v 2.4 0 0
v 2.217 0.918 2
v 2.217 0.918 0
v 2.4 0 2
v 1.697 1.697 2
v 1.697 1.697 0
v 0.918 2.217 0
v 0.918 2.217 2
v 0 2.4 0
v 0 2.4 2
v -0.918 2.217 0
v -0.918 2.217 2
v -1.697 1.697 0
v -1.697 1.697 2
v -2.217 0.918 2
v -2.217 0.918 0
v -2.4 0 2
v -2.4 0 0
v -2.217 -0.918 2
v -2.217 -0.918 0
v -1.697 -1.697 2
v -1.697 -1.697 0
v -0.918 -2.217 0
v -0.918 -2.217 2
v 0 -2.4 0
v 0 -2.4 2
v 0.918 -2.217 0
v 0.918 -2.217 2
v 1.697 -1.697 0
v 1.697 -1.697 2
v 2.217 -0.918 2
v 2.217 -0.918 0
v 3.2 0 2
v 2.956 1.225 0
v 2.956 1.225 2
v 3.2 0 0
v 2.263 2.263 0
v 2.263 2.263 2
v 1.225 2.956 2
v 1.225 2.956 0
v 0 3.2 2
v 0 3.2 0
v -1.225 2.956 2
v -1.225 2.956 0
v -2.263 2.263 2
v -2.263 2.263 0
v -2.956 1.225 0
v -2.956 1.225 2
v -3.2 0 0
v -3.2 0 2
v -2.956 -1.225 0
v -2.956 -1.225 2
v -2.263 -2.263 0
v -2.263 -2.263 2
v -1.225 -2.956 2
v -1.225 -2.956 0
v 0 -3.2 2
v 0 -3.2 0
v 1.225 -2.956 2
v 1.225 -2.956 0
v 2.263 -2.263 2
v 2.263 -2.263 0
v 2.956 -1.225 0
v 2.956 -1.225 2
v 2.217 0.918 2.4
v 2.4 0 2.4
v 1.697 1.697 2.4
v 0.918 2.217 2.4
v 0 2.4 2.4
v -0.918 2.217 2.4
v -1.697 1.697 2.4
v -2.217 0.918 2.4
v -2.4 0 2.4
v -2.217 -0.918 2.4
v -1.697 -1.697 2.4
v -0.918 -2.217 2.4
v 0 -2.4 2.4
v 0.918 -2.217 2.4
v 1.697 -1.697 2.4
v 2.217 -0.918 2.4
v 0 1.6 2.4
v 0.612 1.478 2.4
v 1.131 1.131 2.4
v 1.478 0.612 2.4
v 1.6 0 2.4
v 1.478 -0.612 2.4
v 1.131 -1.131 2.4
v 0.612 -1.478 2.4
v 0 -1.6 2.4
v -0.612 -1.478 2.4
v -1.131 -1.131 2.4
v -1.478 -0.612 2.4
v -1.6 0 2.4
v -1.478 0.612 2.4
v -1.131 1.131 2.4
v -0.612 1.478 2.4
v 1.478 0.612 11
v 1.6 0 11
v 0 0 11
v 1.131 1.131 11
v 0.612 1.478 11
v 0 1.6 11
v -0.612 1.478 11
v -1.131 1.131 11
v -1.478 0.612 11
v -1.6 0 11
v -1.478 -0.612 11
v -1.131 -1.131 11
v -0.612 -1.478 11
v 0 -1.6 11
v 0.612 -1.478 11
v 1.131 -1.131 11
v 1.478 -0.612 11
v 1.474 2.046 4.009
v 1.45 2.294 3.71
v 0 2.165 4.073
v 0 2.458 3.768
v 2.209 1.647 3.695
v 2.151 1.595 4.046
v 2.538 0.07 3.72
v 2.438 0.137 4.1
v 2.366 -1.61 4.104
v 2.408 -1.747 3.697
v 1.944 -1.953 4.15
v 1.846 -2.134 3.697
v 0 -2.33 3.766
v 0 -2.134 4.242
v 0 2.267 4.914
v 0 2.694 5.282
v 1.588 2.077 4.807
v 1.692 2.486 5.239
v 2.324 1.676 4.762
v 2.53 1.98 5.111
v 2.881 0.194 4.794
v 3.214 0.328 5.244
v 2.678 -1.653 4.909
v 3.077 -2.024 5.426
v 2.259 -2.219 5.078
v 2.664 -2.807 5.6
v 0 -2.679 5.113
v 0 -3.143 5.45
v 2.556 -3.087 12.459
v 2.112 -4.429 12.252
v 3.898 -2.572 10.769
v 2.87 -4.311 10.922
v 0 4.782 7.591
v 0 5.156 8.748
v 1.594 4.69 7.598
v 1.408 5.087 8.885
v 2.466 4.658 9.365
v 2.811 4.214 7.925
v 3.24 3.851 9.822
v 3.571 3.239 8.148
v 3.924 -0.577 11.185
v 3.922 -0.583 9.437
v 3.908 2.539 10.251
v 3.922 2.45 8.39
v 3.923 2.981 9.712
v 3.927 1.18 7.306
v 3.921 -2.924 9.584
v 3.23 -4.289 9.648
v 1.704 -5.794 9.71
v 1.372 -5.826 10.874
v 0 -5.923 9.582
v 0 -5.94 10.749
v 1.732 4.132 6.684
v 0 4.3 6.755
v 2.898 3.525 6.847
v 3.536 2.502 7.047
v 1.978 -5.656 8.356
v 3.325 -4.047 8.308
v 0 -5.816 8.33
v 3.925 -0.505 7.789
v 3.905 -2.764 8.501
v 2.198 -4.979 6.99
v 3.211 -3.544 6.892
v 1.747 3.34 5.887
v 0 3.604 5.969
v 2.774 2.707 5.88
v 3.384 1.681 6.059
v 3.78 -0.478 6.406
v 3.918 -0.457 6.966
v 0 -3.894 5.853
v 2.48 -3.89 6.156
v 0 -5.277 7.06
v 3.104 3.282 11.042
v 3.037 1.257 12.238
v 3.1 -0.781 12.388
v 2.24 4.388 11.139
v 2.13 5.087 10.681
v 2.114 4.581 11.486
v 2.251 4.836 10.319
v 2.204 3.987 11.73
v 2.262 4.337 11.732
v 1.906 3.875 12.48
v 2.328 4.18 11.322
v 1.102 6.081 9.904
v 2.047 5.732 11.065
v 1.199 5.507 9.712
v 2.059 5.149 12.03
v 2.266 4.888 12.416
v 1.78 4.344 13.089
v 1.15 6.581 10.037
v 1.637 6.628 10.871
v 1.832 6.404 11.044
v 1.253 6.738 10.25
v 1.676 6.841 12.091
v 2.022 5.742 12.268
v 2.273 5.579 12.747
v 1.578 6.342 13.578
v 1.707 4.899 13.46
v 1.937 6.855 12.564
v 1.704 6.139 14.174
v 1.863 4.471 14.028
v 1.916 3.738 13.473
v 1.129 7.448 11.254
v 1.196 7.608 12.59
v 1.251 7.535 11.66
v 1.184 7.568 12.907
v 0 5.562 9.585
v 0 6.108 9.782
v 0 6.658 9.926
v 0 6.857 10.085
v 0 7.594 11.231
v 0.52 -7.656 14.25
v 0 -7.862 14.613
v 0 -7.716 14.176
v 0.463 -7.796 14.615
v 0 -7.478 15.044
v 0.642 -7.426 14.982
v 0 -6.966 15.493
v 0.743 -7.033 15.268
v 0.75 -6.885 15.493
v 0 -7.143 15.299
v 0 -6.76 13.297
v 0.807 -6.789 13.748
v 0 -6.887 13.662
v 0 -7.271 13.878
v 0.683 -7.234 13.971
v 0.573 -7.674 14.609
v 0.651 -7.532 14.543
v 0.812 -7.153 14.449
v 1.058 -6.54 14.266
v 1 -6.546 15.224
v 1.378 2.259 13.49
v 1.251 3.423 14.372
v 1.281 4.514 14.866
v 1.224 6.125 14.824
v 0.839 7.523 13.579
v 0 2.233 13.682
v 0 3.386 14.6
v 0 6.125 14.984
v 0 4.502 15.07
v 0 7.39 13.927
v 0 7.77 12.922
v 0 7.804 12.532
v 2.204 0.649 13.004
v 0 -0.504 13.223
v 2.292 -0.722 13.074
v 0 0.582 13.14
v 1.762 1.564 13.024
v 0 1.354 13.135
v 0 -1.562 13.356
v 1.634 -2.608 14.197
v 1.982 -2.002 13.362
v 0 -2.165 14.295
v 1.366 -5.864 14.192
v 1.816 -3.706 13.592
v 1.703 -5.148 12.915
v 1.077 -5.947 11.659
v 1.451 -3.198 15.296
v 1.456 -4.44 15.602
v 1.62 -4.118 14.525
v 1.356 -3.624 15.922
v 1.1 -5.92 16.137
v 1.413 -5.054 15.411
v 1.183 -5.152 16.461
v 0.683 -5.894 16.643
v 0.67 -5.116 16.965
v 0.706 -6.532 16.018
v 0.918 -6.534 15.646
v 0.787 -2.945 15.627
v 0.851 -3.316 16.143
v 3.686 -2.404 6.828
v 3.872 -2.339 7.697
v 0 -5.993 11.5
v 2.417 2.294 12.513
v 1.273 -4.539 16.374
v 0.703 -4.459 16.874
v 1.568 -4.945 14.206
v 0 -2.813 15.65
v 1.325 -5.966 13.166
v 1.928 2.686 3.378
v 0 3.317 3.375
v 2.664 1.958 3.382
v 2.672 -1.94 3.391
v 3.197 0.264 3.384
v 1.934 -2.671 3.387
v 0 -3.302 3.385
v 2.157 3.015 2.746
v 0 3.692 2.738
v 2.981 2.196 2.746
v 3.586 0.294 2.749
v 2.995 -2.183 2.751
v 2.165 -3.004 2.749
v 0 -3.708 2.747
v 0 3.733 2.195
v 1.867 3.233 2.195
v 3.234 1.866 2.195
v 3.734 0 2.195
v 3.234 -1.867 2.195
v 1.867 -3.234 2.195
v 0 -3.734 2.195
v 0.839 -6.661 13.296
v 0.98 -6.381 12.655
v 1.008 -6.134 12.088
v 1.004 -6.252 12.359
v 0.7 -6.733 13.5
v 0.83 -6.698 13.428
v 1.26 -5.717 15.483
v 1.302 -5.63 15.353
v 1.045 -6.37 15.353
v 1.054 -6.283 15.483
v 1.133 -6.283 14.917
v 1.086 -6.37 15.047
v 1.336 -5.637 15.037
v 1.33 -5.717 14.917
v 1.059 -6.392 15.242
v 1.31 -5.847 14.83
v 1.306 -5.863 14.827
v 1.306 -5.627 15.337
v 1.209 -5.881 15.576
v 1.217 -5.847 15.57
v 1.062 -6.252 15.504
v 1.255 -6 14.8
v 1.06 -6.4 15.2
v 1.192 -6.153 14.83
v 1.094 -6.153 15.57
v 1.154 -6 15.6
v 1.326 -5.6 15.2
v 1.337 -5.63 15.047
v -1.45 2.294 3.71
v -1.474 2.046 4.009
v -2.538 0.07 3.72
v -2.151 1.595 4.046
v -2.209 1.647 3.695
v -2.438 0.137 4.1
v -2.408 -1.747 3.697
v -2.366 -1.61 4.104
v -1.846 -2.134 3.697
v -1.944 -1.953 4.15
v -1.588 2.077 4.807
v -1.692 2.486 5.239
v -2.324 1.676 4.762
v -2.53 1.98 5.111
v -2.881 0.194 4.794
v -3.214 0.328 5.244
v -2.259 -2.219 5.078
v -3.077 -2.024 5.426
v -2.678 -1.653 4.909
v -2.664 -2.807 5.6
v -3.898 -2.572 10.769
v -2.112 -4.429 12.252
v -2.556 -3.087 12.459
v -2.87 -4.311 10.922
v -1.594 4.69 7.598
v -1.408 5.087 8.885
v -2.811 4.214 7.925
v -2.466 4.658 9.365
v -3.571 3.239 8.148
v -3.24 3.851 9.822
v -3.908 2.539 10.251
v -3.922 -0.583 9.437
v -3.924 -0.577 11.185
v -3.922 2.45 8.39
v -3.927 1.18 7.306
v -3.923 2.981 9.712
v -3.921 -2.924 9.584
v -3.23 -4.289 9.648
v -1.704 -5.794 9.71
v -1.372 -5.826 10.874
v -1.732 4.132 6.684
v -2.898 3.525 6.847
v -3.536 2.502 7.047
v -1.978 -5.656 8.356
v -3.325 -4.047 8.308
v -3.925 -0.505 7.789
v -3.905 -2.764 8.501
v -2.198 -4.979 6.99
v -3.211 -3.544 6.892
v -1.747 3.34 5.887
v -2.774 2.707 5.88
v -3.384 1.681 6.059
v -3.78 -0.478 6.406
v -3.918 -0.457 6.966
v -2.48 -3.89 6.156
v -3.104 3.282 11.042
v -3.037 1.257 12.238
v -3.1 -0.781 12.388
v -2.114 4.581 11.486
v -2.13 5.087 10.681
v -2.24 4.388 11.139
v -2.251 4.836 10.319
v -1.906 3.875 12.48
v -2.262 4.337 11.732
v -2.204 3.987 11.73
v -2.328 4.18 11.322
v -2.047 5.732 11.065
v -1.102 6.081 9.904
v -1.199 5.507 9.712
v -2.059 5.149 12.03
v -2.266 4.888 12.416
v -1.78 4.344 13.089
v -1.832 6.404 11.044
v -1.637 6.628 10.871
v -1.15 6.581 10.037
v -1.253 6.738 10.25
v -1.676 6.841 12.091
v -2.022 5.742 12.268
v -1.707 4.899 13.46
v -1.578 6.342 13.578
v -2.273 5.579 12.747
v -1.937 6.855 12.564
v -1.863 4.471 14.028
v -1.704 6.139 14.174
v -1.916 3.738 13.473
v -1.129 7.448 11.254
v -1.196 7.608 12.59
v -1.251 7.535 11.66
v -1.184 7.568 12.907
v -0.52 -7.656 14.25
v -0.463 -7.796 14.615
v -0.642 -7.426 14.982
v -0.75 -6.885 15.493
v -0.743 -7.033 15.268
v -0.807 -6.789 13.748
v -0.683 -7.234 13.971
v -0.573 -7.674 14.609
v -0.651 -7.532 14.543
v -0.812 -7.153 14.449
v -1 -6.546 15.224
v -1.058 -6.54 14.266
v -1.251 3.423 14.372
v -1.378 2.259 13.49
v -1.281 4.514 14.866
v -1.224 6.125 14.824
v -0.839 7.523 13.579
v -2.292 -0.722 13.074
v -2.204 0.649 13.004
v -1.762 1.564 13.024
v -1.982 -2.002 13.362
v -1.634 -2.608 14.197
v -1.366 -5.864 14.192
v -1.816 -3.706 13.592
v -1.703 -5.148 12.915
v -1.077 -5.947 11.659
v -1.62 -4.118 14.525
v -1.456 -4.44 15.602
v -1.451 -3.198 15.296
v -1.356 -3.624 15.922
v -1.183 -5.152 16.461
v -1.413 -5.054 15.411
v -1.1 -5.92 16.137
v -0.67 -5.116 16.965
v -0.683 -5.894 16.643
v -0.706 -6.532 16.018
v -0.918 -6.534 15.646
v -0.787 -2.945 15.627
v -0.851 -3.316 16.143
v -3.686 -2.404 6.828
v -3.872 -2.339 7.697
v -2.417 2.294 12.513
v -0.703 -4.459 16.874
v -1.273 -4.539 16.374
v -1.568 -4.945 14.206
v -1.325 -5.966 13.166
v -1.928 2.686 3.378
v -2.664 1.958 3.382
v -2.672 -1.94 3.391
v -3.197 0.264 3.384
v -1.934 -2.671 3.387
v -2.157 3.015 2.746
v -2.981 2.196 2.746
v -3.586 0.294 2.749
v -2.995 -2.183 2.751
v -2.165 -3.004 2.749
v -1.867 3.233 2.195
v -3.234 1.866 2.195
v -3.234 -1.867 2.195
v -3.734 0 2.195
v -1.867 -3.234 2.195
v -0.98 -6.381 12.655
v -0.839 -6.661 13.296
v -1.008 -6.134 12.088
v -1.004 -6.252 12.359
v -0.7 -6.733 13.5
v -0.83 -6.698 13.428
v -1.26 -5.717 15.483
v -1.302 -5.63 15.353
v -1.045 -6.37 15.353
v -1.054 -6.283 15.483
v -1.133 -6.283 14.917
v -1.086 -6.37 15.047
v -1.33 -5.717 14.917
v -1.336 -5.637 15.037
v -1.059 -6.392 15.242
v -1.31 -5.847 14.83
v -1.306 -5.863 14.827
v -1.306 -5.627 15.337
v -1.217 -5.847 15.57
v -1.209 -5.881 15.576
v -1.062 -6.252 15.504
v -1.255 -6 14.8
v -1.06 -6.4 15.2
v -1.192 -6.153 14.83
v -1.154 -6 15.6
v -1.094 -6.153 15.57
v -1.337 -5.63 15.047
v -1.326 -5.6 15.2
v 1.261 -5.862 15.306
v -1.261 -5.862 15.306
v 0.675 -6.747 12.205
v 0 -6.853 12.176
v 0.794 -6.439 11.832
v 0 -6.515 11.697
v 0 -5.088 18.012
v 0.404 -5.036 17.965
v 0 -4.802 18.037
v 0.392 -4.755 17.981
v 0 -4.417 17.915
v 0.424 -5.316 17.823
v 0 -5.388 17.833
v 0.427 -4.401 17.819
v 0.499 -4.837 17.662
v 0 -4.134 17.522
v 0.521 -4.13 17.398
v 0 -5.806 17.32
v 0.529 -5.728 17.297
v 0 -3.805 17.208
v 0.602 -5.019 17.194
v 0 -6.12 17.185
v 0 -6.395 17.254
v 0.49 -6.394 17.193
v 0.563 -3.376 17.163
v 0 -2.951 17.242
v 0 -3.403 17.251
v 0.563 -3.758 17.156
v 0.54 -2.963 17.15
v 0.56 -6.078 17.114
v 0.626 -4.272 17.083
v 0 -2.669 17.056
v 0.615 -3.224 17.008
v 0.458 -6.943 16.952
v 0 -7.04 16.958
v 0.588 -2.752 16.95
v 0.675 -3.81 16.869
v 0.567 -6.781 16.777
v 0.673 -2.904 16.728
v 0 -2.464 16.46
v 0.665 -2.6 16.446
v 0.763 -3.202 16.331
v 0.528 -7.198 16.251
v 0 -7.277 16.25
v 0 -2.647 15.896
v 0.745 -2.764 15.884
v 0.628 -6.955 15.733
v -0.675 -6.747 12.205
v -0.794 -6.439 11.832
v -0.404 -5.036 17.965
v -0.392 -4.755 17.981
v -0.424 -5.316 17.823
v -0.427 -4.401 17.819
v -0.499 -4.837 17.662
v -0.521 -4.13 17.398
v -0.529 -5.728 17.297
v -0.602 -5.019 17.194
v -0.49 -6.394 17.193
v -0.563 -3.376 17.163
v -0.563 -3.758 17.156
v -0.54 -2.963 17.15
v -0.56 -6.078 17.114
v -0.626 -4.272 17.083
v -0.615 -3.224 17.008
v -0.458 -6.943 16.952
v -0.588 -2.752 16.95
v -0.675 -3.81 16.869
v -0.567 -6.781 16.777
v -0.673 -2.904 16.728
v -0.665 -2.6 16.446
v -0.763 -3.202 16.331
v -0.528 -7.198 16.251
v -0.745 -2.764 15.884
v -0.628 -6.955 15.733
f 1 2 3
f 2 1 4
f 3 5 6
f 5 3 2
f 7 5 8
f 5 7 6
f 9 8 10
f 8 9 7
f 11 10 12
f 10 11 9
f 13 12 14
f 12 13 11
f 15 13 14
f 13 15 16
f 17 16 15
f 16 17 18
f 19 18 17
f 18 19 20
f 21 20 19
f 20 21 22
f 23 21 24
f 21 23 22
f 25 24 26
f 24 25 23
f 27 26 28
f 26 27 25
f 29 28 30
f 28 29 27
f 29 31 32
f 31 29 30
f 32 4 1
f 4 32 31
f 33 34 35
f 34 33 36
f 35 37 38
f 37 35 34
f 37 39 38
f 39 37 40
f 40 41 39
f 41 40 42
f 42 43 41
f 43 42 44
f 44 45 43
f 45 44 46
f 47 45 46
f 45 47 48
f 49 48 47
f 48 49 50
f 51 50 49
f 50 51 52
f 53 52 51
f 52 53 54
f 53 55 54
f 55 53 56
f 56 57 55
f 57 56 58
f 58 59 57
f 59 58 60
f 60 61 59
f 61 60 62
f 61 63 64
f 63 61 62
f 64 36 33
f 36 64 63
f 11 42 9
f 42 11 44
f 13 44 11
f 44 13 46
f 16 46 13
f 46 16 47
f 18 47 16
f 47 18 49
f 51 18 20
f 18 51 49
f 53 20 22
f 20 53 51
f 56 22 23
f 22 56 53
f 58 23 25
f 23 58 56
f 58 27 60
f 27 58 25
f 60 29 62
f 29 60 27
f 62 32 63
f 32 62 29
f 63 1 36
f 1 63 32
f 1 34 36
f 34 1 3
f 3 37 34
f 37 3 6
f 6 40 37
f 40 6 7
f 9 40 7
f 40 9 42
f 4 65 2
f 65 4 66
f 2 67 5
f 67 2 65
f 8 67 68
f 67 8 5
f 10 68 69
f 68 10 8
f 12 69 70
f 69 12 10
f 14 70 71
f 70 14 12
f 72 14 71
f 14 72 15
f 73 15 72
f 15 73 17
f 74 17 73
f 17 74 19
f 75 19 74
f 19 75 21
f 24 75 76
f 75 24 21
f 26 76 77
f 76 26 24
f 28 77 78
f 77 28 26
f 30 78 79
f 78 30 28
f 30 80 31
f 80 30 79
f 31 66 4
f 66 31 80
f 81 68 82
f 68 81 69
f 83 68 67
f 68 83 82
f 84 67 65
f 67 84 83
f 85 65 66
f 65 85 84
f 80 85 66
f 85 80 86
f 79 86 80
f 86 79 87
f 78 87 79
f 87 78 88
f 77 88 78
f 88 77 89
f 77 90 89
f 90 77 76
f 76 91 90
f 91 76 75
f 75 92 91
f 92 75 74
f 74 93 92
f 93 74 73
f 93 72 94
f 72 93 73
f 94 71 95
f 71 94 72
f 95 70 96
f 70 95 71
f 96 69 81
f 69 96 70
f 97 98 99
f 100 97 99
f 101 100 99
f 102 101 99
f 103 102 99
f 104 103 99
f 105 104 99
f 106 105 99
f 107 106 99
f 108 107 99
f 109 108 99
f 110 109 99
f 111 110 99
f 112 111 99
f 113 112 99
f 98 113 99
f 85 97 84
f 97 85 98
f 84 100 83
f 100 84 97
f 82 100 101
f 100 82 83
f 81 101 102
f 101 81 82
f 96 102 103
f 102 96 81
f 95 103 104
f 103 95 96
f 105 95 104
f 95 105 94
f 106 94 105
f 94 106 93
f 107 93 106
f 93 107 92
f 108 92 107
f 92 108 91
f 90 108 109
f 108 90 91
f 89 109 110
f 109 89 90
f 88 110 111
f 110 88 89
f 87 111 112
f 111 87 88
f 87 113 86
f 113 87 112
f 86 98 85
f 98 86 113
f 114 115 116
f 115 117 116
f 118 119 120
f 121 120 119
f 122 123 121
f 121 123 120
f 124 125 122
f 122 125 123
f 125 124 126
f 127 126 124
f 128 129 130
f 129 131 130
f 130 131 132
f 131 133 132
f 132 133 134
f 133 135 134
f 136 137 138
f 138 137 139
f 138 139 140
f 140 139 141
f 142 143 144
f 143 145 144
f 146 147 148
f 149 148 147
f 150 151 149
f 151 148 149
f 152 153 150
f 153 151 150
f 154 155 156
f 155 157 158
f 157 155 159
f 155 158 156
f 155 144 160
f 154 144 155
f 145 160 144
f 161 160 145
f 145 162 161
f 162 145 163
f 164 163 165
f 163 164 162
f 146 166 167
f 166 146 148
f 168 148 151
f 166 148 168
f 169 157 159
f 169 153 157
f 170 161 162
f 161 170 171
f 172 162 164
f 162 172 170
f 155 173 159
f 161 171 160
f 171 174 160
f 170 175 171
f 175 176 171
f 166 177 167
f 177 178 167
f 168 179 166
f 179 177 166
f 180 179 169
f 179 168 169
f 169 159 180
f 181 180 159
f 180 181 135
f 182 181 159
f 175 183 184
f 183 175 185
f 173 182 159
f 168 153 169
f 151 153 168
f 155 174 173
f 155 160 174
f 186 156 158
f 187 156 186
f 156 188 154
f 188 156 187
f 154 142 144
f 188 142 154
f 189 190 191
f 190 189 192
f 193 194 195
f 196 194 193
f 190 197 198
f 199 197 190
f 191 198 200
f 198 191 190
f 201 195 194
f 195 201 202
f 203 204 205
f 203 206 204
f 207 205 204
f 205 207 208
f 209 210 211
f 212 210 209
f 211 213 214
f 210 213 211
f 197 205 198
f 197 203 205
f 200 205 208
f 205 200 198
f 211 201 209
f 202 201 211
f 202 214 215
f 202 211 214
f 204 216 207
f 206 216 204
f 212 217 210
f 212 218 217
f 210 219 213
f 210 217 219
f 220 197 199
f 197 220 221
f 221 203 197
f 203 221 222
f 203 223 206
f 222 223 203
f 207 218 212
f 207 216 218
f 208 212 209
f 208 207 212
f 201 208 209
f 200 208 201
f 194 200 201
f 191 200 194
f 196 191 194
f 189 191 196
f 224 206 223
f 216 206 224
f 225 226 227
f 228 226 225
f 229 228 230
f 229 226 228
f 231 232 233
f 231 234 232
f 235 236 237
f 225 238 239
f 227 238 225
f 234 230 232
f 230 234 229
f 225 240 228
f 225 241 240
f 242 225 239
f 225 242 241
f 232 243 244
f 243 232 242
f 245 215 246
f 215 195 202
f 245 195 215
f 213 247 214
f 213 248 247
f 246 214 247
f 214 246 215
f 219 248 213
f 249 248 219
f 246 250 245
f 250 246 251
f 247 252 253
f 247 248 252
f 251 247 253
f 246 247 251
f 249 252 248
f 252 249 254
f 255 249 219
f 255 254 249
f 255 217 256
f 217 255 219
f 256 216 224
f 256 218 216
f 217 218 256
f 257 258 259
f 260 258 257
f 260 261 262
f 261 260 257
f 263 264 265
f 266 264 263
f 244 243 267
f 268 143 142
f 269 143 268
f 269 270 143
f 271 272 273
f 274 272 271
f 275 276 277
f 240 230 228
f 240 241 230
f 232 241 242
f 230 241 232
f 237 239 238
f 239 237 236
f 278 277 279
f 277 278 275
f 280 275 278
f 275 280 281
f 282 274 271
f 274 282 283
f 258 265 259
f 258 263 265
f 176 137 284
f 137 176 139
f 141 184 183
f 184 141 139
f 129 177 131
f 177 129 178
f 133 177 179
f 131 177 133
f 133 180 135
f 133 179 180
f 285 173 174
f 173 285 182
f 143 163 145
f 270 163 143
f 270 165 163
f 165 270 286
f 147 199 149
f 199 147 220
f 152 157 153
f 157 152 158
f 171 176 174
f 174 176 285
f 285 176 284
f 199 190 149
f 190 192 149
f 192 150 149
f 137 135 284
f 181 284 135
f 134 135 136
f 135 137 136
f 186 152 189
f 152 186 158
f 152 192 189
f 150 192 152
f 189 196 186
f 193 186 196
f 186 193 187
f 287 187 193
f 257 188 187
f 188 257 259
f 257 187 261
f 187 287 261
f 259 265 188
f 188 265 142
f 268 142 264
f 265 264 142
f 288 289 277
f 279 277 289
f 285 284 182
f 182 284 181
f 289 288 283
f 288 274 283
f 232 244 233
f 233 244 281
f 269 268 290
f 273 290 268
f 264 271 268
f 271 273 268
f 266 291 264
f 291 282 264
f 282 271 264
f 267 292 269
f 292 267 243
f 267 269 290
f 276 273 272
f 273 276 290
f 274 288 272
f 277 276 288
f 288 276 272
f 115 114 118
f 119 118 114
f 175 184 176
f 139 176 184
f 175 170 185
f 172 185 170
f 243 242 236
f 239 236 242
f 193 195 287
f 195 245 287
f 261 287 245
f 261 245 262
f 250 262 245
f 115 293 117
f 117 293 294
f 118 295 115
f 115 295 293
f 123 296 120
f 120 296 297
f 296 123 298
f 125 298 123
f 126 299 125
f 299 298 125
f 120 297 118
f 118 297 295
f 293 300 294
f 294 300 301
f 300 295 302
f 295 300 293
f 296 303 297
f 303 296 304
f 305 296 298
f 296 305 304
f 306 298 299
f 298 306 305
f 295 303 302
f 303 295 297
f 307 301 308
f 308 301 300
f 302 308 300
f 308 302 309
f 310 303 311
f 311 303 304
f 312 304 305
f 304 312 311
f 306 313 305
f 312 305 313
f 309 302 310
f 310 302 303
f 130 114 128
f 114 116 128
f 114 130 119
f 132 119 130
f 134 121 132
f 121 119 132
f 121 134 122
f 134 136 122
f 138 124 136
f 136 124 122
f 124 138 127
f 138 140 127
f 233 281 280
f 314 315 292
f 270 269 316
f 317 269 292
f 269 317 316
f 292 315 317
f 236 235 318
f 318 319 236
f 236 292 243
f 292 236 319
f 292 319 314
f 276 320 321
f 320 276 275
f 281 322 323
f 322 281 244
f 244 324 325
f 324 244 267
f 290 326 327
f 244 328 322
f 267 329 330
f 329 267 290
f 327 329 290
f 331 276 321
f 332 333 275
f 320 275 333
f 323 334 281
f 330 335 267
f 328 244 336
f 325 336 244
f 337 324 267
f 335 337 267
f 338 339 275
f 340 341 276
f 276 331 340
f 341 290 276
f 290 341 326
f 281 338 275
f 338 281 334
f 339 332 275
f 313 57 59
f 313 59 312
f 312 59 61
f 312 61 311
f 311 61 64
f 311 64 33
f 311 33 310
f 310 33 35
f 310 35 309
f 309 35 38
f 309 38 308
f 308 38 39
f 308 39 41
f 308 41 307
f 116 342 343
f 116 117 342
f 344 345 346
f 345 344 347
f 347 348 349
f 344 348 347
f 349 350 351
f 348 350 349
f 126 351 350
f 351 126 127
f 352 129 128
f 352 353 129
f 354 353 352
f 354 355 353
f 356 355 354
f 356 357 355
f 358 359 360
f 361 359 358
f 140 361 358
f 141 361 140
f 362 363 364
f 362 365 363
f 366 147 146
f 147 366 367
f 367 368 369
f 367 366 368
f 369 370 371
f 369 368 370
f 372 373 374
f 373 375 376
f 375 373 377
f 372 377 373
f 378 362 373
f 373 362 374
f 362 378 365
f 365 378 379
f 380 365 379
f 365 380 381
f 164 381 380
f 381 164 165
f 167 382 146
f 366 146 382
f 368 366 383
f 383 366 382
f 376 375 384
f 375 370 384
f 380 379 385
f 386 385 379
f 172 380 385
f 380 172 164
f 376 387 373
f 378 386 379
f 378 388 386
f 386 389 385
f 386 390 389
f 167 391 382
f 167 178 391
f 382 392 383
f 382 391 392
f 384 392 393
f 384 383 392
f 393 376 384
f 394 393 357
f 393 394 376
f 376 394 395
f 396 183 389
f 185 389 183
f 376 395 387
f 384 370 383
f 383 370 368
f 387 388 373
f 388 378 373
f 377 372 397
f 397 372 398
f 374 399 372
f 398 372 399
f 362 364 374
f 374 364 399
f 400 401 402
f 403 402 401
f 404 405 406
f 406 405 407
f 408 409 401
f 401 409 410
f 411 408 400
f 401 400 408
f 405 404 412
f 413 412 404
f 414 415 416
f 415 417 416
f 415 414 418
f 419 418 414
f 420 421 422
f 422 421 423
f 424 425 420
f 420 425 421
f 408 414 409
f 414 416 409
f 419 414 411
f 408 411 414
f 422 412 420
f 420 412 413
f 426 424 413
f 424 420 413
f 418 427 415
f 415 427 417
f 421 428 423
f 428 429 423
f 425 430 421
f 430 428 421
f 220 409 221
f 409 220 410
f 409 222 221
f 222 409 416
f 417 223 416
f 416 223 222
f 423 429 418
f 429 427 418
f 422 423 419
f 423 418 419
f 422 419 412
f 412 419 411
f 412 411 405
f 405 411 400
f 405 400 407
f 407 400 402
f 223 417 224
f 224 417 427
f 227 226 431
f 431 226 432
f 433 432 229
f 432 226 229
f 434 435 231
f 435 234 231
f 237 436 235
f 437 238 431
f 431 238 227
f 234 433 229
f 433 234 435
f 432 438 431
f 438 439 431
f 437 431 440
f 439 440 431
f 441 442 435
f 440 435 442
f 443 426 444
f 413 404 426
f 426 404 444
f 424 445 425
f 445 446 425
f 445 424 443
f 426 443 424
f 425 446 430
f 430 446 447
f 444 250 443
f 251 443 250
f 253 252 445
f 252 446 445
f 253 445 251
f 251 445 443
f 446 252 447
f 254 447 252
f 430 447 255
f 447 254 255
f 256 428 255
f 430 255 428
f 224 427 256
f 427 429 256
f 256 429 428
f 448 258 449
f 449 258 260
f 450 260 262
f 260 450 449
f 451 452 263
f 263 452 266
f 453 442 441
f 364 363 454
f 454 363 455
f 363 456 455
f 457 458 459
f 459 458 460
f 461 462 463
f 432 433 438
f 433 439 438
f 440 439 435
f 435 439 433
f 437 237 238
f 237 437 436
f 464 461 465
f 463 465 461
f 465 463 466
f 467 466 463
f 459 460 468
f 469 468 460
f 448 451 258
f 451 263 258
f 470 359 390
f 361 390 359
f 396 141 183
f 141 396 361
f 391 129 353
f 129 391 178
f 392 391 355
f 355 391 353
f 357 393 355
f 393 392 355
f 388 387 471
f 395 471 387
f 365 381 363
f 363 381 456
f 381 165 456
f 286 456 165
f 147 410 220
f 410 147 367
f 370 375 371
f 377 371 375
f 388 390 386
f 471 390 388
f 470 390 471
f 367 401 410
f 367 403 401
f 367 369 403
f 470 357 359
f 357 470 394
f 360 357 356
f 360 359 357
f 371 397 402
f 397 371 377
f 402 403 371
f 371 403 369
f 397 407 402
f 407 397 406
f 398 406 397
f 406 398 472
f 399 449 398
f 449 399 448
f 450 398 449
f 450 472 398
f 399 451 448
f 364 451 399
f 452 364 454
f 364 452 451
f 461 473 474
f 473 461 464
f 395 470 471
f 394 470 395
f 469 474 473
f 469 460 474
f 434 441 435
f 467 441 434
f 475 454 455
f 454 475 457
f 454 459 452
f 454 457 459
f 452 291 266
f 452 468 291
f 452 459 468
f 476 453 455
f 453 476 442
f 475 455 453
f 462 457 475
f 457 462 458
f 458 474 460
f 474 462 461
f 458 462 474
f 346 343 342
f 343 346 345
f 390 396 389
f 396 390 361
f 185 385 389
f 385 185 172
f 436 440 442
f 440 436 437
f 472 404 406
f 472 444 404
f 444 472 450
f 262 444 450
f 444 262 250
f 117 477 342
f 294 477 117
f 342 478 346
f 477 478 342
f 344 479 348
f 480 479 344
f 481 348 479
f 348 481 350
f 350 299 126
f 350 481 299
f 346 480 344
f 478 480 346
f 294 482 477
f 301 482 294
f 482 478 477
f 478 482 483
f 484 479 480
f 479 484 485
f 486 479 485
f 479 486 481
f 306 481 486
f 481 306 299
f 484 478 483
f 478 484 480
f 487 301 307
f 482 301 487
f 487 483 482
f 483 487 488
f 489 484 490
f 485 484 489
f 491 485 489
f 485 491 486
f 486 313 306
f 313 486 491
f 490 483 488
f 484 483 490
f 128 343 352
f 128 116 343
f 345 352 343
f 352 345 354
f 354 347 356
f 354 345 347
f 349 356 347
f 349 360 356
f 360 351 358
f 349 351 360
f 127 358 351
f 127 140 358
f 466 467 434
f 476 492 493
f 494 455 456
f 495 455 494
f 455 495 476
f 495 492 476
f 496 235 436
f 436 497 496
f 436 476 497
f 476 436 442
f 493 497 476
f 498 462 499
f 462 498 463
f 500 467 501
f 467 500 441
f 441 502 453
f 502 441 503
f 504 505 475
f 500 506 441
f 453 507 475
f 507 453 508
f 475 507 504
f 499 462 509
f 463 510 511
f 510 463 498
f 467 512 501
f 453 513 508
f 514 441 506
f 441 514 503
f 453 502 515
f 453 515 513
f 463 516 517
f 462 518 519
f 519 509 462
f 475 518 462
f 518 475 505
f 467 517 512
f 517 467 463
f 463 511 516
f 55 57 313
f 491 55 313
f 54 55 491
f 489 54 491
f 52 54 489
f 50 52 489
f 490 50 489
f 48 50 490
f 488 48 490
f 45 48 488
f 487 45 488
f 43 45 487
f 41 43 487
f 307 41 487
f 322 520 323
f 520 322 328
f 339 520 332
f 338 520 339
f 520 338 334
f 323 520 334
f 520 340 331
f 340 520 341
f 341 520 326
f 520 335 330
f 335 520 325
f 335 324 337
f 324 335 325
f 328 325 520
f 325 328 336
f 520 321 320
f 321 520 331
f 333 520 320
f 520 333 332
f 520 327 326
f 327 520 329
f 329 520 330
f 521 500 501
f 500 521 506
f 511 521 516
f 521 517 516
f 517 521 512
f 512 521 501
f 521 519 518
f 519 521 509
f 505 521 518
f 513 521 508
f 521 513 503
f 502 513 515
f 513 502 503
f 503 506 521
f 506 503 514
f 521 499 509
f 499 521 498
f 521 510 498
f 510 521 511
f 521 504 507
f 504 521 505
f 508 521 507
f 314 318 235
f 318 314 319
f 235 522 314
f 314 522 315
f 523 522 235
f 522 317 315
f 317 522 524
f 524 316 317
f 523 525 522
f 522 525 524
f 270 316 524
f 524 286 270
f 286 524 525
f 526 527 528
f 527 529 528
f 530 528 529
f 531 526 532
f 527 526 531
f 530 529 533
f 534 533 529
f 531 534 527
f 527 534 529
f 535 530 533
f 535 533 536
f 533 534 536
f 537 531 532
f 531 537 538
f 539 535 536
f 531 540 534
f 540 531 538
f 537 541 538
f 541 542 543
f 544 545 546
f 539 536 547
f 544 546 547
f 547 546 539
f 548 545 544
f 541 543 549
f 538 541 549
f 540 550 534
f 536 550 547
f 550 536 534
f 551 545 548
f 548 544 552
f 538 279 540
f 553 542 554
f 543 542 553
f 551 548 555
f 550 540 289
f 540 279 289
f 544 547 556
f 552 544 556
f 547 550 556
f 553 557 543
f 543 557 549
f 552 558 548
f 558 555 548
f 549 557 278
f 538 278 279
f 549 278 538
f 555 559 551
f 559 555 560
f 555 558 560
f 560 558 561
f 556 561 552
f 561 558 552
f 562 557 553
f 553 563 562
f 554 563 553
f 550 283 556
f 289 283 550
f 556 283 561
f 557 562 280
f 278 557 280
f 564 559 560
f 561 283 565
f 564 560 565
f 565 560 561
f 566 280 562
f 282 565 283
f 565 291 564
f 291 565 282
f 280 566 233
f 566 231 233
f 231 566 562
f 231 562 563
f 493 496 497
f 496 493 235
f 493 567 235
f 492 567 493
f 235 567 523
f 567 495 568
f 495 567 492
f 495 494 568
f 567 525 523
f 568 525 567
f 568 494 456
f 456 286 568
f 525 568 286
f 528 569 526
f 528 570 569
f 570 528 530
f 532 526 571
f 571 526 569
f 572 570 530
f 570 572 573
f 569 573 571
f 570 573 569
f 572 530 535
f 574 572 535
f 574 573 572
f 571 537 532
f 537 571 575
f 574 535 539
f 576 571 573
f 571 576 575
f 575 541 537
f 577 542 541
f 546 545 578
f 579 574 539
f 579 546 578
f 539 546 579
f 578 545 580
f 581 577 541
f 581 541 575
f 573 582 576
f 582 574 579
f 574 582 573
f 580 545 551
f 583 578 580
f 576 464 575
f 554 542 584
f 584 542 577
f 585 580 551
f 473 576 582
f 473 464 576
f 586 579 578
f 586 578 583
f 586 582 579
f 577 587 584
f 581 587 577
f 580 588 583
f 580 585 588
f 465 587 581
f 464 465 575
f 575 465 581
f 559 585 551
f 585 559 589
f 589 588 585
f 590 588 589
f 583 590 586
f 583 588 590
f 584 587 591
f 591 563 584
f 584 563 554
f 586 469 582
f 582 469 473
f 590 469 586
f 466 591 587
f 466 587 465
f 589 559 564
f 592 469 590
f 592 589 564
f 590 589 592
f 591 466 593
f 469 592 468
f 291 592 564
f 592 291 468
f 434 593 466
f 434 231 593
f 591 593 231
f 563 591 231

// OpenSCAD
use <../lib.scad>
use <95342p01.scad>
function ldraw_lib__96143() = [
// 0 ~_Animal Chicken with Red Comb Pattern Dark Tan (Obsolete)
// 0 Name: 96143.dat
// 0 Author: [PTadmin]
// 0 !LDRAW_ORG Part Physical_Colour UPDATE 2019-02
// 0 !LICENSE Licensed under CC BY 4.0 : see CAreadme.txt
// 
// 0 BFC CERTIFY CCW
  [0,"BFC","CERTIFY"],
  [0,"BFC","CCW"],
// 
// 0 !HISTORY 2011-12-29 [PTadmin] Official Update 2011-02
// 0 !HISTORY 2019-08-07 [Holly-Wood] Obsoleted per decision not to include physical colour parts
// 0 !HISTORY 2019-09-09 [PTadmin] Official Update 2019-02
// 
// 
// 0 // This file is a "shortcut" with the correct number for the actual
// 0 // colouring of the part (Dark Tan).
// 
// 1 28 0 0 0 1 0 0 0 1 0 0 0 1 95342p01.dat
  [1,28,0,0,0,1,0,0,0,1,0,0,0,1, ldraw_lib__95342p01()],
];
module ldraw_lib__96143(step=0, col=false, unit=2/5, alt=false, line=0.2, solid=!$preview)
    makepoly(ldraw_lib__96143(), step=step, col=col, unit=unit, alt=alt, line=line, solid=solid);
ldraw_lib__96143(line=0.2);
